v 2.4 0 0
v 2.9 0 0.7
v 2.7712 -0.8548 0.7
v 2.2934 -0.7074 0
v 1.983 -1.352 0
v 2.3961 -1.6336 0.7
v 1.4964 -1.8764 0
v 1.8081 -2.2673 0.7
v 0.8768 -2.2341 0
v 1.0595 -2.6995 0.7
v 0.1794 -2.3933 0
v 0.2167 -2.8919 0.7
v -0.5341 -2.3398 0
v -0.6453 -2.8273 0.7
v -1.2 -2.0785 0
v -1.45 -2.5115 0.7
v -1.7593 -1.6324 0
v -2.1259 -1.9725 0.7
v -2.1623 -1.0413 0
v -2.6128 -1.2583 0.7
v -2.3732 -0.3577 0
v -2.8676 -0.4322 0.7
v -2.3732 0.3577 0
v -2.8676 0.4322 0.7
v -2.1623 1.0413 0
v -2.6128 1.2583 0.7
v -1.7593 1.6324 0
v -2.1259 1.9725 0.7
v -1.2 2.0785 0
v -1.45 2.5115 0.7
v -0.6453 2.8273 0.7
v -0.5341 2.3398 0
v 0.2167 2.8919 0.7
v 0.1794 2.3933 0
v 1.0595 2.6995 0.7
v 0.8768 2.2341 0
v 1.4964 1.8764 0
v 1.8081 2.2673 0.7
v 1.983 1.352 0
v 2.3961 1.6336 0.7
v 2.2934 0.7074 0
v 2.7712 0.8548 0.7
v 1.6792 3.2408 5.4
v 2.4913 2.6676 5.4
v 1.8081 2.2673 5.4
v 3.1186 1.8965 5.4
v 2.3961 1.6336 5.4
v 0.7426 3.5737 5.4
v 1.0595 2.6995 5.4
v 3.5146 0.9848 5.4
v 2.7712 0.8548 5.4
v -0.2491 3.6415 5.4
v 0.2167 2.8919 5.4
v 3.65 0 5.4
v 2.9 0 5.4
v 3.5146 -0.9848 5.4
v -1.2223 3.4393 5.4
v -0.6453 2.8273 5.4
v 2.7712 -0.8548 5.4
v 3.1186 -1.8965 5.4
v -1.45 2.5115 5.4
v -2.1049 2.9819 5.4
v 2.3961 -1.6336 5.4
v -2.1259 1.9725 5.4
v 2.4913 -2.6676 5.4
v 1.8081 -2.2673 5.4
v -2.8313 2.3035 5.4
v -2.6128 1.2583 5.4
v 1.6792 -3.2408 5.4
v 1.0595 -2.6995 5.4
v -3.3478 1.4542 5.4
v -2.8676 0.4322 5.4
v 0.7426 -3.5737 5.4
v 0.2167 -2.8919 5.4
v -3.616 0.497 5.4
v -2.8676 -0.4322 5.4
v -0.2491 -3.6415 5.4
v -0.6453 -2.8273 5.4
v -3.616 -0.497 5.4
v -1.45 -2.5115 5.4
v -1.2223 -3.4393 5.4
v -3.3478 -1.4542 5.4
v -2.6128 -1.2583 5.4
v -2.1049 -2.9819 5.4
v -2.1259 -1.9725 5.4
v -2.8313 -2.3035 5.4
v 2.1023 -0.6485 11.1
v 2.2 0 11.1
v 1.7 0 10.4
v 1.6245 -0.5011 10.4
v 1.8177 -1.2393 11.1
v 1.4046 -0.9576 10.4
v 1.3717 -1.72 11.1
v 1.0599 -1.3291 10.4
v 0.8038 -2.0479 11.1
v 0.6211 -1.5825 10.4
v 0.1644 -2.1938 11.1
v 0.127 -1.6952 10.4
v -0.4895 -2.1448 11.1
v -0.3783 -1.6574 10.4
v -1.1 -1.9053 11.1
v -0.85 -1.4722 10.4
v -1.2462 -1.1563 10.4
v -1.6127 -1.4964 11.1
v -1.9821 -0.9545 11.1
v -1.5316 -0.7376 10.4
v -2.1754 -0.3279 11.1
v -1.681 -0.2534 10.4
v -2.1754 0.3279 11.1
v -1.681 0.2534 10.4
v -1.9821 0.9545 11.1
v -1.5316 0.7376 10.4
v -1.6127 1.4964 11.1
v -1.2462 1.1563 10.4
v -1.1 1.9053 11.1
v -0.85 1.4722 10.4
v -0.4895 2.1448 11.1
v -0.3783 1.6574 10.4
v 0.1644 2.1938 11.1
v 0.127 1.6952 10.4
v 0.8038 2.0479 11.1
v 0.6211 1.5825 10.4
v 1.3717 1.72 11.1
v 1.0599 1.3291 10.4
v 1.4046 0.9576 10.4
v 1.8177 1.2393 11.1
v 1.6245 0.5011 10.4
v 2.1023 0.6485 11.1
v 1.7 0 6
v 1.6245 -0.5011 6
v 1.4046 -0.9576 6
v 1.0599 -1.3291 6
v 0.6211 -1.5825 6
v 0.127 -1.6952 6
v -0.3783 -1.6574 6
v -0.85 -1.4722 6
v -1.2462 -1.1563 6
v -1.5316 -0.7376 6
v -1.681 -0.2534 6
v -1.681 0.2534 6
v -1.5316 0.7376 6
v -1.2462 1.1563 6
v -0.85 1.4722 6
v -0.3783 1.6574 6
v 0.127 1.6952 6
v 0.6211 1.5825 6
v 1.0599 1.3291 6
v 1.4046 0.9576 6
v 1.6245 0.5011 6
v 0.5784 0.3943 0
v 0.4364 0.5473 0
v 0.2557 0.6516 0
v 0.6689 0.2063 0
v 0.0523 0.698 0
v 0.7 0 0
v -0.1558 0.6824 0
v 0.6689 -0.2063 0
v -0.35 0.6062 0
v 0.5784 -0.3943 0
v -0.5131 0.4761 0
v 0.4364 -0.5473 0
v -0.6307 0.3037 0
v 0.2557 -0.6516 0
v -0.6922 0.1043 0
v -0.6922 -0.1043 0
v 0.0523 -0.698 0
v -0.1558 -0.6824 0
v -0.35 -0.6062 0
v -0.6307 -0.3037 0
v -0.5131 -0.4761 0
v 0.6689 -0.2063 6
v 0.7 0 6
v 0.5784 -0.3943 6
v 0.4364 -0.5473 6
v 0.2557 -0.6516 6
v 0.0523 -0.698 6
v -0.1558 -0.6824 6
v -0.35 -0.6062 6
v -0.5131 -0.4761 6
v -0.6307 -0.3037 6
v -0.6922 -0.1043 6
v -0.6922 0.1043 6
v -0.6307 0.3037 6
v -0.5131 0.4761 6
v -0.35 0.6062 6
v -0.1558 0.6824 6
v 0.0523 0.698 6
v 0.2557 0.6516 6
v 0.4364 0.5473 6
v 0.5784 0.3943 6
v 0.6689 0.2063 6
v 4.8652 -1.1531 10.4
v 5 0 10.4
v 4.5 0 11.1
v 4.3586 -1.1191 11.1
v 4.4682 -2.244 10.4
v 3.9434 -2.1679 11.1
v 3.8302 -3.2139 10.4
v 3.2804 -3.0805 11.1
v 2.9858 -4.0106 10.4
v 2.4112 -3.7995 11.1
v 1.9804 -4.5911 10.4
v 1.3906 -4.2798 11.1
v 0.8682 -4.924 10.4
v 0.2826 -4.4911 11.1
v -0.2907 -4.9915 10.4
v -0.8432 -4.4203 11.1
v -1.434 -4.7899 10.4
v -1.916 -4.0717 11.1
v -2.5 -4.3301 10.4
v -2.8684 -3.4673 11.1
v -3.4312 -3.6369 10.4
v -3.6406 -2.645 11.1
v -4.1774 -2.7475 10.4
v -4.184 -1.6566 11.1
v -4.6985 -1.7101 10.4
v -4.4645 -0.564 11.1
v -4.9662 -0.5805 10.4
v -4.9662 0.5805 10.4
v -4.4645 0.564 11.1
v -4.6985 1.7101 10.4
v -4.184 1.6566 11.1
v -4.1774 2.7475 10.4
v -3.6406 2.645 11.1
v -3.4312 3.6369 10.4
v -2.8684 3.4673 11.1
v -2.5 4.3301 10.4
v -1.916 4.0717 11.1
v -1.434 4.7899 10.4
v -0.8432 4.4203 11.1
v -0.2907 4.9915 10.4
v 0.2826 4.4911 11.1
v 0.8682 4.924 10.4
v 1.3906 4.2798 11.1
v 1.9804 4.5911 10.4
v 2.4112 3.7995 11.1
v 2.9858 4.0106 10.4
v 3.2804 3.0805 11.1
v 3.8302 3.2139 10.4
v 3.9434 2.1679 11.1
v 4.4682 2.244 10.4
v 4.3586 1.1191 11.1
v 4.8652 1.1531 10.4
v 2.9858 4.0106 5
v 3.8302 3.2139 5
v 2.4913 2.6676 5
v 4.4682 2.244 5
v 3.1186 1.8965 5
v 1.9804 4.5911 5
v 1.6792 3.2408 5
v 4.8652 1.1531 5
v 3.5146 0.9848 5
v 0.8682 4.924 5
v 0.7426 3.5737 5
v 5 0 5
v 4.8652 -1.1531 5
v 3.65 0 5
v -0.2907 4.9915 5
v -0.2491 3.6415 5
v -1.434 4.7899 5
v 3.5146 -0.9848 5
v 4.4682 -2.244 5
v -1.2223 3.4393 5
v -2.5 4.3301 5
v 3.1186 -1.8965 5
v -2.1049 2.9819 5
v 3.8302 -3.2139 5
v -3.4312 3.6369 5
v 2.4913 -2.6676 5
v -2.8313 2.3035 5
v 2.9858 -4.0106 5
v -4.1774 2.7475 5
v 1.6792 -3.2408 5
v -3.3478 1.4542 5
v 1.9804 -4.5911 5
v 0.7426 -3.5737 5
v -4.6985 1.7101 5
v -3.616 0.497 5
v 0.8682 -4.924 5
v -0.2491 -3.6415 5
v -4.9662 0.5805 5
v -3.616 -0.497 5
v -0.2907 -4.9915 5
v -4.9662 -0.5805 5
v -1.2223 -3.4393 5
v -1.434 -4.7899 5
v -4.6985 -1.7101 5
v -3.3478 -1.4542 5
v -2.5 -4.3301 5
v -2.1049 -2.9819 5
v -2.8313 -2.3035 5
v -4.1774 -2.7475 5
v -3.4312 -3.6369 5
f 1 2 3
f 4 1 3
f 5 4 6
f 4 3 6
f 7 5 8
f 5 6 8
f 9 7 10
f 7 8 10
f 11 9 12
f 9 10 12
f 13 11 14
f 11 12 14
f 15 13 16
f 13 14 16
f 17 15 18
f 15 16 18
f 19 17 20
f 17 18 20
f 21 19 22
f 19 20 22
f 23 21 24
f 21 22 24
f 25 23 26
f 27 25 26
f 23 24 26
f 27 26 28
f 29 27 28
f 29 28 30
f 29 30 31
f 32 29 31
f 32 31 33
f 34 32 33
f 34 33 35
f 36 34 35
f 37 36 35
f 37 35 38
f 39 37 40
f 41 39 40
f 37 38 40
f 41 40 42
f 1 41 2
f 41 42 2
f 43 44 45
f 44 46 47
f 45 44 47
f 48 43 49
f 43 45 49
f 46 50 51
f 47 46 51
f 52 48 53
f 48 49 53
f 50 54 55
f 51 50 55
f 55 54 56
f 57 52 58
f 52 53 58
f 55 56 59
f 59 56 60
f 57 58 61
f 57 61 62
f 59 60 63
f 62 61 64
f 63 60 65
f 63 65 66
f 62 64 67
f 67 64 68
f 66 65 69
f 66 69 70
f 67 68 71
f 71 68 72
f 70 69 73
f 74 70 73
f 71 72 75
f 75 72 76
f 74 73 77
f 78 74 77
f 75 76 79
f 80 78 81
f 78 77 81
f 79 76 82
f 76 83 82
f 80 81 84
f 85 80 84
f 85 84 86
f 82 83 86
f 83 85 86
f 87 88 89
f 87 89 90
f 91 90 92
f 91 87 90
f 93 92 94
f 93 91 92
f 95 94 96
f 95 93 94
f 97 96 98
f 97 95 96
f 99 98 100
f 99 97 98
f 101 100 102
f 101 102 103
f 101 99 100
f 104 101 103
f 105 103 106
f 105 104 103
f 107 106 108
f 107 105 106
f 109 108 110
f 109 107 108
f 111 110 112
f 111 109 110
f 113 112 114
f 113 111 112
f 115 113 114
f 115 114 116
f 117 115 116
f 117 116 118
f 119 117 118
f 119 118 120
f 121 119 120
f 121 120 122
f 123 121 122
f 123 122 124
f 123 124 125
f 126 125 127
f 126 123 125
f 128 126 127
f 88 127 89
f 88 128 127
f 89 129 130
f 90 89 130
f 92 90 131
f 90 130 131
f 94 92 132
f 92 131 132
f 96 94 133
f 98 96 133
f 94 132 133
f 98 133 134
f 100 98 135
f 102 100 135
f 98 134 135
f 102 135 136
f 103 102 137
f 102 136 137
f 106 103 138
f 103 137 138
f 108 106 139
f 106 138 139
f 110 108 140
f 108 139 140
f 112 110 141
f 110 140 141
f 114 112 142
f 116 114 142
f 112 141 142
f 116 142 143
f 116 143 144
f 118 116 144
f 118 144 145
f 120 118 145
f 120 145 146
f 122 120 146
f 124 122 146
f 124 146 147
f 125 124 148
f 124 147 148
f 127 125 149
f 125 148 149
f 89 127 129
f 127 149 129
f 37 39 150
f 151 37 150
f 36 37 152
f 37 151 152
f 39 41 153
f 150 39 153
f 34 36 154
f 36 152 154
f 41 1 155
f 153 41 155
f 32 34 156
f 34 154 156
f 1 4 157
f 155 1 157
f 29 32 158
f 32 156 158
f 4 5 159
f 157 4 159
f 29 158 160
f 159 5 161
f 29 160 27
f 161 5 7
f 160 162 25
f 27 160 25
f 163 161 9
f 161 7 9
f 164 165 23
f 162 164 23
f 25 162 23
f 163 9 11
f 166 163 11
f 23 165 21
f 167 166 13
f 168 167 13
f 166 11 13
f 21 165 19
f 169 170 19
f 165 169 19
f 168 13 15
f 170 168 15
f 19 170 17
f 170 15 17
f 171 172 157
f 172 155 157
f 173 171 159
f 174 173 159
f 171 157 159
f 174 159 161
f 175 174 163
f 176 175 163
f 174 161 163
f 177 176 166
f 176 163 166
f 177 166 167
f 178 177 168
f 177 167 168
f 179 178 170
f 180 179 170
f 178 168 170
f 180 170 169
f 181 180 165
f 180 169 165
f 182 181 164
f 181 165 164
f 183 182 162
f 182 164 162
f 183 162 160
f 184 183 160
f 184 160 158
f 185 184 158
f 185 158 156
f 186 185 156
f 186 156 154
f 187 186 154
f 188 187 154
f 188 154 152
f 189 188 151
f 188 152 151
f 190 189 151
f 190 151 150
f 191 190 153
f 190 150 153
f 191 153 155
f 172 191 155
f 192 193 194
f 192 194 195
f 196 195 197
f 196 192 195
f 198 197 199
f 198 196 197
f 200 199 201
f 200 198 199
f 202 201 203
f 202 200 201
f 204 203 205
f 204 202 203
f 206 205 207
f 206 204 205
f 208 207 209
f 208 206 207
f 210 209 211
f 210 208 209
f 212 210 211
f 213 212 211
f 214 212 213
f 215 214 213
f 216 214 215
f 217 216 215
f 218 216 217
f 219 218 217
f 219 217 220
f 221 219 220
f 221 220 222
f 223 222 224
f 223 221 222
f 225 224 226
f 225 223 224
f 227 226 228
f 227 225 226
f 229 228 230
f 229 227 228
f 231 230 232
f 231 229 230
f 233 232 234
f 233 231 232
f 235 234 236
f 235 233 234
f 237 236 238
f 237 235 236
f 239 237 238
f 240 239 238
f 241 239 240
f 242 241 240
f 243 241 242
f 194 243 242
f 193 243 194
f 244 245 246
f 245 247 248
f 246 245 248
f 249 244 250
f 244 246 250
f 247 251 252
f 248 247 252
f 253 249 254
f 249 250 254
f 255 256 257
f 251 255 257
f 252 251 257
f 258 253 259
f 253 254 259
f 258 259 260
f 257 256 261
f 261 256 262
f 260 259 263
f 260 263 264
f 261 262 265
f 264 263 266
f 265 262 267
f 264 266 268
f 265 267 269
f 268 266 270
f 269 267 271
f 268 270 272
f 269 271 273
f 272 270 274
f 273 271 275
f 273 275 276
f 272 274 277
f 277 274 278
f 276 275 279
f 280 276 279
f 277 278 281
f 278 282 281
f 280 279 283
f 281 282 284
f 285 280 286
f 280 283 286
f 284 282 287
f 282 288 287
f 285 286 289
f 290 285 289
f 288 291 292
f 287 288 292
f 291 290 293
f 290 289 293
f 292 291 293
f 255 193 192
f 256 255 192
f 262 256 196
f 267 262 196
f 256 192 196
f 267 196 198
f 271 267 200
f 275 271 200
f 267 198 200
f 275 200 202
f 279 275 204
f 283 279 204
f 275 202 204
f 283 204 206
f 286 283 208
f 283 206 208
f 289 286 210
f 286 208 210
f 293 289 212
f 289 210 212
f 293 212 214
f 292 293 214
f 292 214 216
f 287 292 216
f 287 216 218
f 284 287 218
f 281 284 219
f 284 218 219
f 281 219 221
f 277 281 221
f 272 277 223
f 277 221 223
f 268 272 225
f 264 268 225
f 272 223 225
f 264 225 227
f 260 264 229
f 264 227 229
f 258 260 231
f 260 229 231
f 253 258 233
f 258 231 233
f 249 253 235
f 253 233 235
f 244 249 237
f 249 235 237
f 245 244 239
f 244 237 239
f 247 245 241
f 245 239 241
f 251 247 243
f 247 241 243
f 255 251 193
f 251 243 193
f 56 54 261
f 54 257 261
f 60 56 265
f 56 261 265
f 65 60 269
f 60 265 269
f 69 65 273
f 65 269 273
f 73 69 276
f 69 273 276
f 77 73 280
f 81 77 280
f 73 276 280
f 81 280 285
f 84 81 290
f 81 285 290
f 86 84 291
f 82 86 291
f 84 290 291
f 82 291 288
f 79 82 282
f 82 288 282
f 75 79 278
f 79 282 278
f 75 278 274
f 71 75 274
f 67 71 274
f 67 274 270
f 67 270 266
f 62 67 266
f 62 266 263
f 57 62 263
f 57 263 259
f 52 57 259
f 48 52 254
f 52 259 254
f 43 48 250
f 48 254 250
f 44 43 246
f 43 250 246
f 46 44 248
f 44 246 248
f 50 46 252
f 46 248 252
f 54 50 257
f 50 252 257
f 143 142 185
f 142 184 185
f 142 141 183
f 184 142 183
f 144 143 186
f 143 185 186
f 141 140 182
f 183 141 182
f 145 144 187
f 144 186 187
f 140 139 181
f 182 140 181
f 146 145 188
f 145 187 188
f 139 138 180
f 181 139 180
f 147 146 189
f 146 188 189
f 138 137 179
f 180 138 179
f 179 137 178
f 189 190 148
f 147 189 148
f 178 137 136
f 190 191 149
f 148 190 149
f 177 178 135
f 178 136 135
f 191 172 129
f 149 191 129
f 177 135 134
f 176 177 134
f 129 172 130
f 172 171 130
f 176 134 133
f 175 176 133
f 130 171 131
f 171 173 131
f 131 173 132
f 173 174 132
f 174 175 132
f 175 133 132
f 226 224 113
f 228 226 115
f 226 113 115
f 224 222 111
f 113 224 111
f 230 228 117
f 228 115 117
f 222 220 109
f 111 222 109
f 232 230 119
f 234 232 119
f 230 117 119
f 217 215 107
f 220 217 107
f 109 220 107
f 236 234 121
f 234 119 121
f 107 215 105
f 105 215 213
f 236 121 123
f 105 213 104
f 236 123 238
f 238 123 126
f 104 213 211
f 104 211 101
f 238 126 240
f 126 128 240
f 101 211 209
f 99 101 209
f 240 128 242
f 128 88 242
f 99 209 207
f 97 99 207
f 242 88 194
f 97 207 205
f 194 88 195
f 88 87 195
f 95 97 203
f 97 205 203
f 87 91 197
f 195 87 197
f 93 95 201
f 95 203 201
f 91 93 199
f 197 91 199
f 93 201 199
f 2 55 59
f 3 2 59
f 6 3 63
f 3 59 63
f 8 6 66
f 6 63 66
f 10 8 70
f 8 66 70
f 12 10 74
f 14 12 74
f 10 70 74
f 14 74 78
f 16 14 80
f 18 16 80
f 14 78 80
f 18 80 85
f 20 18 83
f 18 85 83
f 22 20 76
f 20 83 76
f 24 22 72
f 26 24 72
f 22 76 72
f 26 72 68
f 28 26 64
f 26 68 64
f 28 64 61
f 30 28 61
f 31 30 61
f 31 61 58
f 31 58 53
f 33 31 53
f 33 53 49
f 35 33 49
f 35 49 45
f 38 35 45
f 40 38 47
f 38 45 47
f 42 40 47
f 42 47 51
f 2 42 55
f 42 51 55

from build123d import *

# Parameters (mm, degrees)
F2_C1_SIZE2 = 0.5
F2_C1_SIZE  = 0.7
F2_C2_SIZE2 = 0.7
F2_C2_SIZE  = 0.5
F2_C3_SIZE2 = 0.7
F2_C3_SIZE  = 0.5


with BuildPart() as f1:
    # F0 (on Front) → F1 (revolve)
    with BuildSketch(Plane.XZ):
        Polygon((0.7, 6), (0.7, 0), (2.9, 0), (2.9, 5.4), (3.65, 5.4), (3.65, 5), (5, 5), (5, 11.1), (1.7, 11.1), (1.7, 6), align=None)
    revolve(axis=Axis((0, 0, 5.55), (0, 0, -1)))

    # F2: chamfer of 0.7 x 0.5 on 3 edges, made by hand

    # F2_c1
    f2_c1_edges = [f1.edges().sort_by_distance(p)[0] for p in [
        (-1.7, 0, 11.1),
    ]]
    f2_c1_side = f1.faces().sort_by_distance((-1.7, 0, 11.09))[0]
    chamfer(f2_c1_edges, length=F2_C1_SIZE, length2=F2_C1_SIZE2, reference=f2_c1_side)

    # F2_c2
    f2_c2_edges = [f1.edges().sort_by_distance(p)[0] for p in [
        (-2.9, 0, 0),
    ]]
    f2_c2_side = f1.faces().sort_by_distance((-2.89, 0, 0))[0]
    chamfer(f2_c2_edges, length=F2_C2_SIZE, length2=F2_C2_SIZE2, reference=f2_c2_side)

    # F2_c3
    f2_c3_edges = [f1.edges().sort_by_distance(p)[0] for p in [
        (-5, 0, 11.1),
    ]]
    f2_c3_side = f1.faces().sort_by_distance((-4.99, 0, 11.1))[0]
    chamfer(f2_c3_edges, length=F2_C3_SIZE, length2=F2_C3_SIZE2, reference=f2_c3_side)


solid = f1.part
